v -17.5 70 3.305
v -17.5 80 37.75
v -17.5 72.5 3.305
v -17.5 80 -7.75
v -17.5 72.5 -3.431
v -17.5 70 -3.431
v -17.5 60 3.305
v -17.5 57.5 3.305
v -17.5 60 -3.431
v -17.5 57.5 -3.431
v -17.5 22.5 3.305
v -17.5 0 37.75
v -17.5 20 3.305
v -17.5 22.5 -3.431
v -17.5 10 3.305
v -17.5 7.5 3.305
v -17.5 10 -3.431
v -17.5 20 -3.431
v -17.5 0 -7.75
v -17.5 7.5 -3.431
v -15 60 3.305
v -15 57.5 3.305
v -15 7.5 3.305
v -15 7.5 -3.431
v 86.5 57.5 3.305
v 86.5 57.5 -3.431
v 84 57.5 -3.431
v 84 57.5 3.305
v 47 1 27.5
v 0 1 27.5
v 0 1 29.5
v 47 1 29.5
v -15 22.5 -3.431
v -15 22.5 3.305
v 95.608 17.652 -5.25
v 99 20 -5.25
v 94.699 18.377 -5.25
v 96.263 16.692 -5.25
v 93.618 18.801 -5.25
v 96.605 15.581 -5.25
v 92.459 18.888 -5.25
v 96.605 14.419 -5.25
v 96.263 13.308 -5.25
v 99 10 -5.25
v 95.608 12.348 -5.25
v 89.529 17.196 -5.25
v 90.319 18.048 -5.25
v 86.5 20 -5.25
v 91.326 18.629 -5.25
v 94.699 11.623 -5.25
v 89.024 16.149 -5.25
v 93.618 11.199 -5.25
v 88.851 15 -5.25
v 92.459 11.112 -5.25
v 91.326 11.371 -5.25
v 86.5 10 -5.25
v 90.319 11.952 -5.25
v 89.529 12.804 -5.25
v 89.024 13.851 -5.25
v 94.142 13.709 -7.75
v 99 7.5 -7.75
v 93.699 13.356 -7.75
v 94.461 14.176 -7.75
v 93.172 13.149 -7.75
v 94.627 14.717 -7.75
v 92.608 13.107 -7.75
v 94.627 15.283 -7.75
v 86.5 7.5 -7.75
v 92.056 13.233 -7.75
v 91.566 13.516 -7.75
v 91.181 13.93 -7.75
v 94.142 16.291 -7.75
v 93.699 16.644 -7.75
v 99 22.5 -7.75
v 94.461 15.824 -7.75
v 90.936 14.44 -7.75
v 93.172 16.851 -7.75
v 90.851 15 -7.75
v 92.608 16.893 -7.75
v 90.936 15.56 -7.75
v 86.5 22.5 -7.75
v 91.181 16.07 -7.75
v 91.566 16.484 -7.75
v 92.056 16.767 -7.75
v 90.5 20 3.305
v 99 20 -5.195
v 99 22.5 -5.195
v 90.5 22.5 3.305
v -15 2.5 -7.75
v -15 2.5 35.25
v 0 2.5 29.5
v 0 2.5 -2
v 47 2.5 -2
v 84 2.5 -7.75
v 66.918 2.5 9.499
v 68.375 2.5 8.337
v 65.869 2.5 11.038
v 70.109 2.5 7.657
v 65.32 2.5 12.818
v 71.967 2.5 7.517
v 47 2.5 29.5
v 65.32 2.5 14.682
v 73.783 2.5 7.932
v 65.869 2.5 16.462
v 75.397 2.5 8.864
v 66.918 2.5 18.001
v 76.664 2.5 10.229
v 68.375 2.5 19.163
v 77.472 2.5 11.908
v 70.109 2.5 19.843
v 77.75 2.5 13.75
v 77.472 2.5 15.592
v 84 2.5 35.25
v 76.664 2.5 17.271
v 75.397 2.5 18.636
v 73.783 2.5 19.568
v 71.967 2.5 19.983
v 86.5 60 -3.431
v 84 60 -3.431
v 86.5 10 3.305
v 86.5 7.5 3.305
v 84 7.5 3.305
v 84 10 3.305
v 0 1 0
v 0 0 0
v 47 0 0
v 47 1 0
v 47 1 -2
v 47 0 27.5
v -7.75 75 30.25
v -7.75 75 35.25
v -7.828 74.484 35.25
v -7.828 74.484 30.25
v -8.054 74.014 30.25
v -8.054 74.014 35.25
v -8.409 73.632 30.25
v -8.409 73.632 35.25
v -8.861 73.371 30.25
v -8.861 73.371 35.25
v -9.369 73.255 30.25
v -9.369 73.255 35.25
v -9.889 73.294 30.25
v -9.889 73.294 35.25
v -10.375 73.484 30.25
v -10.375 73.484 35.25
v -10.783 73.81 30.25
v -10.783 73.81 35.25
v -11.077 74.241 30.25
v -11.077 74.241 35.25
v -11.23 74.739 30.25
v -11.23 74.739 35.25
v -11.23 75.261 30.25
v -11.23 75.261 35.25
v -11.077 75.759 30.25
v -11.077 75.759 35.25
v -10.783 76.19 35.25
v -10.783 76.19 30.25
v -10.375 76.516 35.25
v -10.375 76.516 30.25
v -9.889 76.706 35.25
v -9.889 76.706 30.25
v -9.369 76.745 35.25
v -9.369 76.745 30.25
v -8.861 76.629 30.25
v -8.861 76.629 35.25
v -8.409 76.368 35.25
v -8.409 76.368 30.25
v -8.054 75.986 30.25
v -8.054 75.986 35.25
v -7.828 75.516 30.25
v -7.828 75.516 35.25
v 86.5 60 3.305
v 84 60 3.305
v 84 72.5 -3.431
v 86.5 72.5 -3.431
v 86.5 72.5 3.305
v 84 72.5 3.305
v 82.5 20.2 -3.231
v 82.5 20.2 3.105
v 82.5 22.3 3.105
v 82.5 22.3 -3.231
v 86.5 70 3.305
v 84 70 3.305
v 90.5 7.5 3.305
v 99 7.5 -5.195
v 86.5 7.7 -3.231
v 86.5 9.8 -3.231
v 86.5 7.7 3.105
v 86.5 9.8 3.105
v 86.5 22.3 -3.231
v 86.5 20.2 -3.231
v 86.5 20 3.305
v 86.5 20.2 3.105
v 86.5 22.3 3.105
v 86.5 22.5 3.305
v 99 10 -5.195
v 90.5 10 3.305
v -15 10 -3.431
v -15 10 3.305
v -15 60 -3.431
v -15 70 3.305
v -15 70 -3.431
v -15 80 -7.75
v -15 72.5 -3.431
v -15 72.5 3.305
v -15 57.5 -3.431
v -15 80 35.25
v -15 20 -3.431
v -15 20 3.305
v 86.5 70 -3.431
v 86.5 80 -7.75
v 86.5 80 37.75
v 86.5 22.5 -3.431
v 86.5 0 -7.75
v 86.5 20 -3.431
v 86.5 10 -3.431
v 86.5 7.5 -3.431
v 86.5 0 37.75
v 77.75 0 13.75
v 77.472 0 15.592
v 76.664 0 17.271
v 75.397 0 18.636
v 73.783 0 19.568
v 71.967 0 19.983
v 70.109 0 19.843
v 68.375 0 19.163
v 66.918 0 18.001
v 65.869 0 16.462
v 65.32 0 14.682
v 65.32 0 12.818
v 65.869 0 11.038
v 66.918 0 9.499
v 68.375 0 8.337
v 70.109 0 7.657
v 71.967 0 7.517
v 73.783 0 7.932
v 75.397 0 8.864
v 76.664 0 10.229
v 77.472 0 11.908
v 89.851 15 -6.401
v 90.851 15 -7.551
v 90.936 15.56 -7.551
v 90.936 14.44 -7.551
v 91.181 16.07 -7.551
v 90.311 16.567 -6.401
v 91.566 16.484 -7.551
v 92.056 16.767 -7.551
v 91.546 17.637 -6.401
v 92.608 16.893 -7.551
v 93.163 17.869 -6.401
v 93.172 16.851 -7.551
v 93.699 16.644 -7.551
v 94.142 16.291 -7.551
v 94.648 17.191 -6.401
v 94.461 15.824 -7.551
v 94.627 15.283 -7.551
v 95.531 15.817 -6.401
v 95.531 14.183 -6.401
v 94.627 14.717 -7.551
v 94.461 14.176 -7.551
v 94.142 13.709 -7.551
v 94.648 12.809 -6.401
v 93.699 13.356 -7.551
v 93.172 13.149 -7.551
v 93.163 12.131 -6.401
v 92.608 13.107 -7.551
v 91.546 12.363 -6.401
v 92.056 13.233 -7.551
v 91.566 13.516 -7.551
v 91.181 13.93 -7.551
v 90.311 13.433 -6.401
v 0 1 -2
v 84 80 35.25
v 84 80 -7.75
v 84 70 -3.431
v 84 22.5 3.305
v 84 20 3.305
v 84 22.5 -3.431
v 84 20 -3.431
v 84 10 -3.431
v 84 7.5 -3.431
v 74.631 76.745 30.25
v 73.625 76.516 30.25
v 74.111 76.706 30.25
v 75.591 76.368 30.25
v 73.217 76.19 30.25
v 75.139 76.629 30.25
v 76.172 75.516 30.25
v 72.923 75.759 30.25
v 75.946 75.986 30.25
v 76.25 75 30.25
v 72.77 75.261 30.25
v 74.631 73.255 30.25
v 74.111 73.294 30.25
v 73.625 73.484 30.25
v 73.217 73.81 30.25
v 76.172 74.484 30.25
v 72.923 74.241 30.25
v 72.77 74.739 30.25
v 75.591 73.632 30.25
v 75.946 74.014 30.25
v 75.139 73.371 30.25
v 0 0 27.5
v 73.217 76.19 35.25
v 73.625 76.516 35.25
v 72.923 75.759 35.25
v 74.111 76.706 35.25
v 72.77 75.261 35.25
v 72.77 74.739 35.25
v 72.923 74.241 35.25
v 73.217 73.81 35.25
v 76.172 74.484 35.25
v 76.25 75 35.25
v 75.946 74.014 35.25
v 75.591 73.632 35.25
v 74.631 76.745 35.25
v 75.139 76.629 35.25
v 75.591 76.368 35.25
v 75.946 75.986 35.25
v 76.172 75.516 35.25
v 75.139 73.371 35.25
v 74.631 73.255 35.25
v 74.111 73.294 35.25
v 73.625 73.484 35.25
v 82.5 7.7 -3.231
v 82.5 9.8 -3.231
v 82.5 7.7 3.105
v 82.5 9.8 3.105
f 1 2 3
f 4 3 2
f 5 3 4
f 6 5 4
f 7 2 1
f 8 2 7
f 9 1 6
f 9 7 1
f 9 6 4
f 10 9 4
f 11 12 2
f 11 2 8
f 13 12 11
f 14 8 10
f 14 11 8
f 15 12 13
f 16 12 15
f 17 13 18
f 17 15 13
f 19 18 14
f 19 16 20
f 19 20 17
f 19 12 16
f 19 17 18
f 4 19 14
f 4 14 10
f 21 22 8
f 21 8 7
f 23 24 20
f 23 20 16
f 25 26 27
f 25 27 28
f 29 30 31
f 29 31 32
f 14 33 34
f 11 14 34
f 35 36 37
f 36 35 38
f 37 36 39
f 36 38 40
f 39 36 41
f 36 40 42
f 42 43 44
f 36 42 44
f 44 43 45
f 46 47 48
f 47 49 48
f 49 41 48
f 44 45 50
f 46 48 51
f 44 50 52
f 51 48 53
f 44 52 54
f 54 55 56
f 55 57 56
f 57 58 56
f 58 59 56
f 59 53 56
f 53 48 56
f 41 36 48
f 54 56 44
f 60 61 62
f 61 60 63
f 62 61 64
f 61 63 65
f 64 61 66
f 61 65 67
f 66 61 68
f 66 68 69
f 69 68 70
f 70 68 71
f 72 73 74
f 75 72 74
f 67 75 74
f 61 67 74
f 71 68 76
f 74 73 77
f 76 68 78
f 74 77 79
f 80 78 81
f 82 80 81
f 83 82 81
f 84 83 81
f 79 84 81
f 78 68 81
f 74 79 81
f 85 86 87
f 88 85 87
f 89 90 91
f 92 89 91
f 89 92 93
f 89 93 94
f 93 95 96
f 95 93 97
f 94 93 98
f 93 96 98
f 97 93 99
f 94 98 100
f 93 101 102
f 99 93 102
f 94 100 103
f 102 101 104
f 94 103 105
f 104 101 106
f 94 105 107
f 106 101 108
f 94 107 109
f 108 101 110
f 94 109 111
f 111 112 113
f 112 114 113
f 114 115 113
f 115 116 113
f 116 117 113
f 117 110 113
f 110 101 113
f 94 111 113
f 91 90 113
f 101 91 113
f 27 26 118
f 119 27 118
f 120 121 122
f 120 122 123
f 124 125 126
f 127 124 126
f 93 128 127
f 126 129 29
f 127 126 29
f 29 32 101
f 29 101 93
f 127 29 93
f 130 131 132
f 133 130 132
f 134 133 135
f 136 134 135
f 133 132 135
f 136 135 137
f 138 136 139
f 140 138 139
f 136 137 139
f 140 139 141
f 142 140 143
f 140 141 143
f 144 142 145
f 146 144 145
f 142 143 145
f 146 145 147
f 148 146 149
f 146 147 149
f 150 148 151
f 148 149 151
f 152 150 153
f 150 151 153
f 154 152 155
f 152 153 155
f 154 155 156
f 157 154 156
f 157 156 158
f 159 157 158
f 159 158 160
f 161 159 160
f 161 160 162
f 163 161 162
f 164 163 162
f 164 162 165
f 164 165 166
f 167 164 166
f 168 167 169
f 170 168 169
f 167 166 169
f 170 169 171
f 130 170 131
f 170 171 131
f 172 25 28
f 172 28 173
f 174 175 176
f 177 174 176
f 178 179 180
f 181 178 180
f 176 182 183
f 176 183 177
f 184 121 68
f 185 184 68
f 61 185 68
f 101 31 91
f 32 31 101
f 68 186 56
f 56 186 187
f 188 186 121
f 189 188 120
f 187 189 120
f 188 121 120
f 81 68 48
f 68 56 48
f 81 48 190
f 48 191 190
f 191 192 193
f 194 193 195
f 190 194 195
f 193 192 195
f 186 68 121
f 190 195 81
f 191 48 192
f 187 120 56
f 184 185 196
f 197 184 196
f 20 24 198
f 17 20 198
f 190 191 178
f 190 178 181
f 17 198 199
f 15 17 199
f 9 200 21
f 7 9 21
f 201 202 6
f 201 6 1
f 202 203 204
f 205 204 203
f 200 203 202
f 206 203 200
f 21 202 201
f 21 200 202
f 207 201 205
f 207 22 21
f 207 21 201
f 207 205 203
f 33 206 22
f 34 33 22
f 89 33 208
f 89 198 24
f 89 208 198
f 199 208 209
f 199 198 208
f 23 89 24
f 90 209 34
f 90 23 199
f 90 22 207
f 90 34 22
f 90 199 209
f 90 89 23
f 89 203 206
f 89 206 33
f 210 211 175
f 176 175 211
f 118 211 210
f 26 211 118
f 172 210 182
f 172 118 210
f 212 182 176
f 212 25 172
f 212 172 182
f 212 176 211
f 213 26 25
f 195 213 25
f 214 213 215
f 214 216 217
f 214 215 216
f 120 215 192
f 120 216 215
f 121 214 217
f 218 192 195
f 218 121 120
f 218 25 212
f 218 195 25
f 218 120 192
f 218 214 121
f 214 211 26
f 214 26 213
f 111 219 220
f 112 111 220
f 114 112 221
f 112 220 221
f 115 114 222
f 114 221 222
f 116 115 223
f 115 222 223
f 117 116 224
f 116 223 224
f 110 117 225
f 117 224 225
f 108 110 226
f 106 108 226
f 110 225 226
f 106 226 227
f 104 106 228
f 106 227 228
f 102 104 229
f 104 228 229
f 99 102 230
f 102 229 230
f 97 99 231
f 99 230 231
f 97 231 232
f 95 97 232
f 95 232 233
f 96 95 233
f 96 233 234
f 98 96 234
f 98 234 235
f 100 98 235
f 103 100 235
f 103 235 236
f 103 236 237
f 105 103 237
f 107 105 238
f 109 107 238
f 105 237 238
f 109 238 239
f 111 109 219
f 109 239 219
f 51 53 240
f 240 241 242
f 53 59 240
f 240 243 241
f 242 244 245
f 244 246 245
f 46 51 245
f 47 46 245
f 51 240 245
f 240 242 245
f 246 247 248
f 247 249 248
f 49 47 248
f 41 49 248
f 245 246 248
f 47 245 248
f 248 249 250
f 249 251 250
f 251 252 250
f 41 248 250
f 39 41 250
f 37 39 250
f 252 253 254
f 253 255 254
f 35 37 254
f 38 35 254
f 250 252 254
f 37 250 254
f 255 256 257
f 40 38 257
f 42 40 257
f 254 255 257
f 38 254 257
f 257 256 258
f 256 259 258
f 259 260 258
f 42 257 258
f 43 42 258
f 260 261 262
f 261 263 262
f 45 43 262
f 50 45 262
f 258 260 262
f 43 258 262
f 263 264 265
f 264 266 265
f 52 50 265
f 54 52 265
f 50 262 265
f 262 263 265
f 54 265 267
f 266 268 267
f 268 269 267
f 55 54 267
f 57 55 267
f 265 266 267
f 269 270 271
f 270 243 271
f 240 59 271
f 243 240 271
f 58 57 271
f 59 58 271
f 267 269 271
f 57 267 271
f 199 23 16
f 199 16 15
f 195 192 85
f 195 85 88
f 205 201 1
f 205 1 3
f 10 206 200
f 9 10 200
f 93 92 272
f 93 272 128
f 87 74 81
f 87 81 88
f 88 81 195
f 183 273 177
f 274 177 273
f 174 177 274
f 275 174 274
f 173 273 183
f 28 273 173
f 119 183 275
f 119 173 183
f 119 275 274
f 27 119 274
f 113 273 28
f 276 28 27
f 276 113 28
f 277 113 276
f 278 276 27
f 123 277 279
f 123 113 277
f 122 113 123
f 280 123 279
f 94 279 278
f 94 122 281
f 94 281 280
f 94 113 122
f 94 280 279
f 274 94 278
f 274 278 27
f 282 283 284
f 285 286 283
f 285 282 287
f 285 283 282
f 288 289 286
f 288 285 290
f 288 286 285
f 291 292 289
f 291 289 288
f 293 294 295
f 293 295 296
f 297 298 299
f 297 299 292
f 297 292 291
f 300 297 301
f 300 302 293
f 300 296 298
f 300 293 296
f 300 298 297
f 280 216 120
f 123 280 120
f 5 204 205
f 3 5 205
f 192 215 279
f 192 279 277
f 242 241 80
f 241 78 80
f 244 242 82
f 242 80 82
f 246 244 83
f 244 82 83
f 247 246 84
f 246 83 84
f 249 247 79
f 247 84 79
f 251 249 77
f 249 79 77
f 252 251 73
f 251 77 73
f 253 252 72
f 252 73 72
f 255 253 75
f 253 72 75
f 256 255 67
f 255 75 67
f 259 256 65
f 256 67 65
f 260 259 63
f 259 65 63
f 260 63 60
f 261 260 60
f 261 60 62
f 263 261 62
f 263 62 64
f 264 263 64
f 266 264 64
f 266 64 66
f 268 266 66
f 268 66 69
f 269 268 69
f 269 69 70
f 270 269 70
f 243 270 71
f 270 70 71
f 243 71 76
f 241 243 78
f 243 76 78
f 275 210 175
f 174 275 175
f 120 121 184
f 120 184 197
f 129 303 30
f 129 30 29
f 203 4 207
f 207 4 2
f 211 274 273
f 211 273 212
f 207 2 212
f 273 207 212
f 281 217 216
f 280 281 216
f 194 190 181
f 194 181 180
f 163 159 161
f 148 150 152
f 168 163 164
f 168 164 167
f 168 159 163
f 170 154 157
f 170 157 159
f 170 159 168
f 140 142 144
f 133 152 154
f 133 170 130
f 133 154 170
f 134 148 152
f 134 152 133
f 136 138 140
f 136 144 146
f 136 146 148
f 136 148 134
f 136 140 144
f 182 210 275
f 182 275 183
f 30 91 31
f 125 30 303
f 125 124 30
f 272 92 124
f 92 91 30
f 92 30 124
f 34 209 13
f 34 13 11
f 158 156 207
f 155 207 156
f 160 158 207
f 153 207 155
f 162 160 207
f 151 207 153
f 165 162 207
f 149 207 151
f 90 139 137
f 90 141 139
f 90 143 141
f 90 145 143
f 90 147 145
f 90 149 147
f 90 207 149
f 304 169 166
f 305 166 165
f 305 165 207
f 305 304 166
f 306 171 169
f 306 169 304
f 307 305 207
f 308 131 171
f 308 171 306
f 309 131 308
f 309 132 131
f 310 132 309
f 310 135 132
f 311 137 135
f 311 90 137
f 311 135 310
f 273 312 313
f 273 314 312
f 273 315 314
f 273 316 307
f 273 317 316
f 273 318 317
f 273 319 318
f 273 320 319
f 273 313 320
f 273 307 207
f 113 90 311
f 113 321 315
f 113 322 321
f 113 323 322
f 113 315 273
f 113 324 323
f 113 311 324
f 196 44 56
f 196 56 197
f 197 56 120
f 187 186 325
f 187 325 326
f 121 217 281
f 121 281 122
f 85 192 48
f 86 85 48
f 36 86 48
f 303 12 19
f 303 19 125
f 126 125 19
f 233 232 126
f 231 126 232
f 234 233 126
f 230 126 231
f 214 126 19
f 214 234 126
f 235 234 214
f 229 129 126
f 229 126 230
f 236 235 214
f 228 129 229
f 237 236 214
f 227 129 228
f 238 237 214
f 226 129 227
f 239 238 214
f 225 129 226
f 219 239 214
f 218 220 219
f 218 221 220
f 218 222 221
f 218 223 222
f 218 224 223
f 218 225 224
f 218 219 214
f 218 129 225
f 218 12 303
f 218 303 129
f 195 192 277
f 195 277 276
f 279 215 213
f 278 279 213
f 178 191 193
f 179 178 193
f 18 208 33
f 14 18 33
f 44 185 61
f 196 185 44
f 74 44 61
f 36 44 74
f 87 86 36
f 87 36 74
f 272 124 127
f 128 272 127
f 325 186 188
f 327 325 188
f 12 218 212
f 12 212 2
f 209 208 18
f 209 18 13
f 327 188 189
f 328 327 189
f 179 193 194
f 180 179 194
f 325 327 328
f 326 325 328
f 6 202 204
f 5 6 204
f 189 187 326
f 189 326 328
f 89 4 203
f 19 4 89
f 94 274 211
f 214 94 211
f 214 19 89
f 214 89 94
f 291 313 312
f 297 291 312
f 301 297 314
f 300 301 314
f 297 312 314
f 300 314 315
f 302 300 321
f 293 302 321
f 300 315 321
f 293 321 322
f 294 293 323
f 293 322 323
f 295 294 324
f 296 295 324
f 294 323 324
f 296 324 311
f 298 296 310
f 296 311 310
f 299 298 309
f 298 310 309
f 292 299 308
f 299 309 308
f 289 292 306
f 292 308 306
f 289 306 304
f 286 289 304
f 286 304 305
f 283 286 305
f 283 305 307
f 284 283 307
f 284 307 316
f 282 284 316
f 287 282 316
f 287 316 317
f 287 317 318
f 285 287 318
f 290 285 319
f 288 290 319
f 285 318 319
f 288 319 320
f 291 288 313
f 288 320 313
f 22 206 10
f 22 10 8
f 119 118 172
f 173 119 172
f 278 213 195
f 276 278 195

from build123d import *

# Parameters (mm, degrees)
F2_DEPTH        = 80
F1_W            = 99
F1_H            = 43
F1_W_2          = 47
F1_H_2          = 27.5
F1_R            = 6.25
F3_DEPTH        = 2.5
F4_R            = 1.75
F5_DEPTH        = 5
F6_W            = 2.5
F6_H            = 6.7354051862
F6_W_2          = 2.1
F6_H_2          = 6.3354051862
F7_DEPTH        = 104
F8_DEPTH        = 12.5
F9_DEPTH        = 4
F10_SIZE        = 8.5
F12_D           = 3.7973
F12_CSINK_D     = 7.7978
F12_CSINK_ANGLE = 82
F14_DEPTH       = 2
F15_W           = 47
F15_H           = 1.5
F16_DEPTH       = 2


with BuildPart() as f2:
    # F1 (on Front) → F2 (new body)
    with BuildSketch(Plane.XZ):
        Polygon((-15, -7.75), (-15, 35.25), (84, 35.25), (84, -7.75), (86.5, -7.75), (86.5, 37.75), (-17.5, 37.75), (-17.5, -7.75), align=None)
    extrude(amount=-F2_DEPTH)

    # F1 (on Front) → F3 (join)
    with BuildSketch(Plane.XZ):
        with Locations((34.5, 13.75)):
            Rectangle(F1_W, F1_H)
        with Locations((23.5, 13.75)):
            Rectangle(F1_W_2, F1_H_2, mode=Mode.SUBTRACT)
        with Locations((71.5, 13.75)):
            Circle(F1_R, mode=Mode.SUBTRACT)
    extrude(amount=-F3_DEPTH)

    # F4 (on face) → F5 (join)
    with BuildSketch(Plane(origin=(0, 0, 35.25), x_dir=(1, 0, 0), z_dir=(0, 0, -1))):
        with Locations((-9.5, -75)):
            Circle(F4_R)
        with Locations((74.5, -75)):
            Circle(F4_R)
    extrude(amount=F5_DEPTH)

    # F6 (on face) → F7 (cut, through all)
    with BuildSketch(Plane.YZ.offset(86.5)):
        with Locations((8.75, -0.0630606664)):
            Rectangle(F6_W, F6_H)
        with Locations((8.75, -0.0630606664)):
            Rectangle(F6_W_2, F6_H_2, mode=Mode.SUBTRACT)
        with Locations((21.25, -0.0630606664)):
            Rectangle(F6_W, F6_H)
        with Locations((21.25, -0.0630606664)):
            Rectangle(F6_W_2, F6_H_2, mode=Mode.SUBTRACT)
        with Locations((58.75, -0.0630606664)):
            Rectangle(F6_W, F6_H)
        with Locations((71.25, -0.0630606664)):
            Rectangle(F6_W, F6_H)
        with Locations((8.75, -0.0630606664)):
            Rectangle(F6_W_2, F6_H_2)
        with Locations((21.25, -0.0630606664)):
            Rectangle(F6_W_2, F6_H_2)
    extrude(amount=-F7_DEPTH, mode=Mode.SUBTRACT)

    # F13 (on face) → F14 (cut)
    with BuildSketch(Plane.XY):
        Polygon((47, 2.5), (0, 2.5), (0, 1), (47, 1), (47, 1.25), align=None)
    extrude(amount=-F14_DEPTH, mode=Mode.SUBTRACT)

    # F15 (on face) → F16 (cut)
    with BuildSketch(Plane(origin=(0, 0, 27.5), x_dir=(1, 0, 0), z_dir=(0, 0, -1))):
        with Locations((23.5, -1.75)):
            Rectangle(F15_W, F15_H)
    extrude(amount=-F16_DEPTH, mode=Mode.SUBTRACT)


with BuildPart() as f8:
    # F6 (on face) → F8 (new body)
    with BuildSketch(Plane.YZ.offset(86.5)):
        with Locations((8.75, -0.0630606664)):
            Rectangle(F6_W, F6_H)
        with Locations((8.75, -0.0630606664)):
            Rectangle(F6_W_2, F6_H_2, mode=Mode.SUBTRACT)
        Polygon((7.5, -3.4307632595), (7.5, -7.75), (15, -7.75), (22.5, -7.75), (22.5, -3.4307632595), (20, -3.4307632595), (20, -5.25), (15, -5.25), (10, -5.25), (10, -3.4307632595), align=None)
        with Locations((21.25, -0.0630606664)):
            Rectangle(F6_W, F6_H)
        with Locations((21.25, -0.0630606664)):
            Rectangle(F6_W_2, F6_H_2, mode=Mode.SUBTRACT)
        with Locations((8.75, -0.0630606664)):
            Rectangle(F6_W_2, F6_H_2)
        with Locations((21.25, -0.0630606664)):
            Rectangle(F6_W_2, F6_H_2)
    extrude(amount=F8_DEPTH)

    # F6 (on face) → F9 (join)
    with BuildSketch(Plane.YZ.offset(86.5)):
        with Locations((8.75, -0.0630606664)):
            Rectangle(F6_W_2, F6_H_2)
        with Locations((21.25, -0.0630606664)):
            Rectangle(F6_W_2, F6_H_2)
    extrude(amount=-F9_DEPTH)

    # F10
    f10_edges = [f8.edges().sort_by_distance(p)[0] for p in [
        (99, 8.75, 3.304642),
        (99, 21.25, 3.304642),
    ]]
    chamfer(f10_edges, length=F10_SIZE)

    # F12 (through all)
    with Locations(Plane.XY.offset(-5.25)):
        with Locations((92.75, 15)):
            CounterSinkHole(F12_D / 2, F12_CSINK_D / 2, counter_sink_angle=F12_CSINK_ANGLE)


solid = Compound([f2.part, f8.part])
